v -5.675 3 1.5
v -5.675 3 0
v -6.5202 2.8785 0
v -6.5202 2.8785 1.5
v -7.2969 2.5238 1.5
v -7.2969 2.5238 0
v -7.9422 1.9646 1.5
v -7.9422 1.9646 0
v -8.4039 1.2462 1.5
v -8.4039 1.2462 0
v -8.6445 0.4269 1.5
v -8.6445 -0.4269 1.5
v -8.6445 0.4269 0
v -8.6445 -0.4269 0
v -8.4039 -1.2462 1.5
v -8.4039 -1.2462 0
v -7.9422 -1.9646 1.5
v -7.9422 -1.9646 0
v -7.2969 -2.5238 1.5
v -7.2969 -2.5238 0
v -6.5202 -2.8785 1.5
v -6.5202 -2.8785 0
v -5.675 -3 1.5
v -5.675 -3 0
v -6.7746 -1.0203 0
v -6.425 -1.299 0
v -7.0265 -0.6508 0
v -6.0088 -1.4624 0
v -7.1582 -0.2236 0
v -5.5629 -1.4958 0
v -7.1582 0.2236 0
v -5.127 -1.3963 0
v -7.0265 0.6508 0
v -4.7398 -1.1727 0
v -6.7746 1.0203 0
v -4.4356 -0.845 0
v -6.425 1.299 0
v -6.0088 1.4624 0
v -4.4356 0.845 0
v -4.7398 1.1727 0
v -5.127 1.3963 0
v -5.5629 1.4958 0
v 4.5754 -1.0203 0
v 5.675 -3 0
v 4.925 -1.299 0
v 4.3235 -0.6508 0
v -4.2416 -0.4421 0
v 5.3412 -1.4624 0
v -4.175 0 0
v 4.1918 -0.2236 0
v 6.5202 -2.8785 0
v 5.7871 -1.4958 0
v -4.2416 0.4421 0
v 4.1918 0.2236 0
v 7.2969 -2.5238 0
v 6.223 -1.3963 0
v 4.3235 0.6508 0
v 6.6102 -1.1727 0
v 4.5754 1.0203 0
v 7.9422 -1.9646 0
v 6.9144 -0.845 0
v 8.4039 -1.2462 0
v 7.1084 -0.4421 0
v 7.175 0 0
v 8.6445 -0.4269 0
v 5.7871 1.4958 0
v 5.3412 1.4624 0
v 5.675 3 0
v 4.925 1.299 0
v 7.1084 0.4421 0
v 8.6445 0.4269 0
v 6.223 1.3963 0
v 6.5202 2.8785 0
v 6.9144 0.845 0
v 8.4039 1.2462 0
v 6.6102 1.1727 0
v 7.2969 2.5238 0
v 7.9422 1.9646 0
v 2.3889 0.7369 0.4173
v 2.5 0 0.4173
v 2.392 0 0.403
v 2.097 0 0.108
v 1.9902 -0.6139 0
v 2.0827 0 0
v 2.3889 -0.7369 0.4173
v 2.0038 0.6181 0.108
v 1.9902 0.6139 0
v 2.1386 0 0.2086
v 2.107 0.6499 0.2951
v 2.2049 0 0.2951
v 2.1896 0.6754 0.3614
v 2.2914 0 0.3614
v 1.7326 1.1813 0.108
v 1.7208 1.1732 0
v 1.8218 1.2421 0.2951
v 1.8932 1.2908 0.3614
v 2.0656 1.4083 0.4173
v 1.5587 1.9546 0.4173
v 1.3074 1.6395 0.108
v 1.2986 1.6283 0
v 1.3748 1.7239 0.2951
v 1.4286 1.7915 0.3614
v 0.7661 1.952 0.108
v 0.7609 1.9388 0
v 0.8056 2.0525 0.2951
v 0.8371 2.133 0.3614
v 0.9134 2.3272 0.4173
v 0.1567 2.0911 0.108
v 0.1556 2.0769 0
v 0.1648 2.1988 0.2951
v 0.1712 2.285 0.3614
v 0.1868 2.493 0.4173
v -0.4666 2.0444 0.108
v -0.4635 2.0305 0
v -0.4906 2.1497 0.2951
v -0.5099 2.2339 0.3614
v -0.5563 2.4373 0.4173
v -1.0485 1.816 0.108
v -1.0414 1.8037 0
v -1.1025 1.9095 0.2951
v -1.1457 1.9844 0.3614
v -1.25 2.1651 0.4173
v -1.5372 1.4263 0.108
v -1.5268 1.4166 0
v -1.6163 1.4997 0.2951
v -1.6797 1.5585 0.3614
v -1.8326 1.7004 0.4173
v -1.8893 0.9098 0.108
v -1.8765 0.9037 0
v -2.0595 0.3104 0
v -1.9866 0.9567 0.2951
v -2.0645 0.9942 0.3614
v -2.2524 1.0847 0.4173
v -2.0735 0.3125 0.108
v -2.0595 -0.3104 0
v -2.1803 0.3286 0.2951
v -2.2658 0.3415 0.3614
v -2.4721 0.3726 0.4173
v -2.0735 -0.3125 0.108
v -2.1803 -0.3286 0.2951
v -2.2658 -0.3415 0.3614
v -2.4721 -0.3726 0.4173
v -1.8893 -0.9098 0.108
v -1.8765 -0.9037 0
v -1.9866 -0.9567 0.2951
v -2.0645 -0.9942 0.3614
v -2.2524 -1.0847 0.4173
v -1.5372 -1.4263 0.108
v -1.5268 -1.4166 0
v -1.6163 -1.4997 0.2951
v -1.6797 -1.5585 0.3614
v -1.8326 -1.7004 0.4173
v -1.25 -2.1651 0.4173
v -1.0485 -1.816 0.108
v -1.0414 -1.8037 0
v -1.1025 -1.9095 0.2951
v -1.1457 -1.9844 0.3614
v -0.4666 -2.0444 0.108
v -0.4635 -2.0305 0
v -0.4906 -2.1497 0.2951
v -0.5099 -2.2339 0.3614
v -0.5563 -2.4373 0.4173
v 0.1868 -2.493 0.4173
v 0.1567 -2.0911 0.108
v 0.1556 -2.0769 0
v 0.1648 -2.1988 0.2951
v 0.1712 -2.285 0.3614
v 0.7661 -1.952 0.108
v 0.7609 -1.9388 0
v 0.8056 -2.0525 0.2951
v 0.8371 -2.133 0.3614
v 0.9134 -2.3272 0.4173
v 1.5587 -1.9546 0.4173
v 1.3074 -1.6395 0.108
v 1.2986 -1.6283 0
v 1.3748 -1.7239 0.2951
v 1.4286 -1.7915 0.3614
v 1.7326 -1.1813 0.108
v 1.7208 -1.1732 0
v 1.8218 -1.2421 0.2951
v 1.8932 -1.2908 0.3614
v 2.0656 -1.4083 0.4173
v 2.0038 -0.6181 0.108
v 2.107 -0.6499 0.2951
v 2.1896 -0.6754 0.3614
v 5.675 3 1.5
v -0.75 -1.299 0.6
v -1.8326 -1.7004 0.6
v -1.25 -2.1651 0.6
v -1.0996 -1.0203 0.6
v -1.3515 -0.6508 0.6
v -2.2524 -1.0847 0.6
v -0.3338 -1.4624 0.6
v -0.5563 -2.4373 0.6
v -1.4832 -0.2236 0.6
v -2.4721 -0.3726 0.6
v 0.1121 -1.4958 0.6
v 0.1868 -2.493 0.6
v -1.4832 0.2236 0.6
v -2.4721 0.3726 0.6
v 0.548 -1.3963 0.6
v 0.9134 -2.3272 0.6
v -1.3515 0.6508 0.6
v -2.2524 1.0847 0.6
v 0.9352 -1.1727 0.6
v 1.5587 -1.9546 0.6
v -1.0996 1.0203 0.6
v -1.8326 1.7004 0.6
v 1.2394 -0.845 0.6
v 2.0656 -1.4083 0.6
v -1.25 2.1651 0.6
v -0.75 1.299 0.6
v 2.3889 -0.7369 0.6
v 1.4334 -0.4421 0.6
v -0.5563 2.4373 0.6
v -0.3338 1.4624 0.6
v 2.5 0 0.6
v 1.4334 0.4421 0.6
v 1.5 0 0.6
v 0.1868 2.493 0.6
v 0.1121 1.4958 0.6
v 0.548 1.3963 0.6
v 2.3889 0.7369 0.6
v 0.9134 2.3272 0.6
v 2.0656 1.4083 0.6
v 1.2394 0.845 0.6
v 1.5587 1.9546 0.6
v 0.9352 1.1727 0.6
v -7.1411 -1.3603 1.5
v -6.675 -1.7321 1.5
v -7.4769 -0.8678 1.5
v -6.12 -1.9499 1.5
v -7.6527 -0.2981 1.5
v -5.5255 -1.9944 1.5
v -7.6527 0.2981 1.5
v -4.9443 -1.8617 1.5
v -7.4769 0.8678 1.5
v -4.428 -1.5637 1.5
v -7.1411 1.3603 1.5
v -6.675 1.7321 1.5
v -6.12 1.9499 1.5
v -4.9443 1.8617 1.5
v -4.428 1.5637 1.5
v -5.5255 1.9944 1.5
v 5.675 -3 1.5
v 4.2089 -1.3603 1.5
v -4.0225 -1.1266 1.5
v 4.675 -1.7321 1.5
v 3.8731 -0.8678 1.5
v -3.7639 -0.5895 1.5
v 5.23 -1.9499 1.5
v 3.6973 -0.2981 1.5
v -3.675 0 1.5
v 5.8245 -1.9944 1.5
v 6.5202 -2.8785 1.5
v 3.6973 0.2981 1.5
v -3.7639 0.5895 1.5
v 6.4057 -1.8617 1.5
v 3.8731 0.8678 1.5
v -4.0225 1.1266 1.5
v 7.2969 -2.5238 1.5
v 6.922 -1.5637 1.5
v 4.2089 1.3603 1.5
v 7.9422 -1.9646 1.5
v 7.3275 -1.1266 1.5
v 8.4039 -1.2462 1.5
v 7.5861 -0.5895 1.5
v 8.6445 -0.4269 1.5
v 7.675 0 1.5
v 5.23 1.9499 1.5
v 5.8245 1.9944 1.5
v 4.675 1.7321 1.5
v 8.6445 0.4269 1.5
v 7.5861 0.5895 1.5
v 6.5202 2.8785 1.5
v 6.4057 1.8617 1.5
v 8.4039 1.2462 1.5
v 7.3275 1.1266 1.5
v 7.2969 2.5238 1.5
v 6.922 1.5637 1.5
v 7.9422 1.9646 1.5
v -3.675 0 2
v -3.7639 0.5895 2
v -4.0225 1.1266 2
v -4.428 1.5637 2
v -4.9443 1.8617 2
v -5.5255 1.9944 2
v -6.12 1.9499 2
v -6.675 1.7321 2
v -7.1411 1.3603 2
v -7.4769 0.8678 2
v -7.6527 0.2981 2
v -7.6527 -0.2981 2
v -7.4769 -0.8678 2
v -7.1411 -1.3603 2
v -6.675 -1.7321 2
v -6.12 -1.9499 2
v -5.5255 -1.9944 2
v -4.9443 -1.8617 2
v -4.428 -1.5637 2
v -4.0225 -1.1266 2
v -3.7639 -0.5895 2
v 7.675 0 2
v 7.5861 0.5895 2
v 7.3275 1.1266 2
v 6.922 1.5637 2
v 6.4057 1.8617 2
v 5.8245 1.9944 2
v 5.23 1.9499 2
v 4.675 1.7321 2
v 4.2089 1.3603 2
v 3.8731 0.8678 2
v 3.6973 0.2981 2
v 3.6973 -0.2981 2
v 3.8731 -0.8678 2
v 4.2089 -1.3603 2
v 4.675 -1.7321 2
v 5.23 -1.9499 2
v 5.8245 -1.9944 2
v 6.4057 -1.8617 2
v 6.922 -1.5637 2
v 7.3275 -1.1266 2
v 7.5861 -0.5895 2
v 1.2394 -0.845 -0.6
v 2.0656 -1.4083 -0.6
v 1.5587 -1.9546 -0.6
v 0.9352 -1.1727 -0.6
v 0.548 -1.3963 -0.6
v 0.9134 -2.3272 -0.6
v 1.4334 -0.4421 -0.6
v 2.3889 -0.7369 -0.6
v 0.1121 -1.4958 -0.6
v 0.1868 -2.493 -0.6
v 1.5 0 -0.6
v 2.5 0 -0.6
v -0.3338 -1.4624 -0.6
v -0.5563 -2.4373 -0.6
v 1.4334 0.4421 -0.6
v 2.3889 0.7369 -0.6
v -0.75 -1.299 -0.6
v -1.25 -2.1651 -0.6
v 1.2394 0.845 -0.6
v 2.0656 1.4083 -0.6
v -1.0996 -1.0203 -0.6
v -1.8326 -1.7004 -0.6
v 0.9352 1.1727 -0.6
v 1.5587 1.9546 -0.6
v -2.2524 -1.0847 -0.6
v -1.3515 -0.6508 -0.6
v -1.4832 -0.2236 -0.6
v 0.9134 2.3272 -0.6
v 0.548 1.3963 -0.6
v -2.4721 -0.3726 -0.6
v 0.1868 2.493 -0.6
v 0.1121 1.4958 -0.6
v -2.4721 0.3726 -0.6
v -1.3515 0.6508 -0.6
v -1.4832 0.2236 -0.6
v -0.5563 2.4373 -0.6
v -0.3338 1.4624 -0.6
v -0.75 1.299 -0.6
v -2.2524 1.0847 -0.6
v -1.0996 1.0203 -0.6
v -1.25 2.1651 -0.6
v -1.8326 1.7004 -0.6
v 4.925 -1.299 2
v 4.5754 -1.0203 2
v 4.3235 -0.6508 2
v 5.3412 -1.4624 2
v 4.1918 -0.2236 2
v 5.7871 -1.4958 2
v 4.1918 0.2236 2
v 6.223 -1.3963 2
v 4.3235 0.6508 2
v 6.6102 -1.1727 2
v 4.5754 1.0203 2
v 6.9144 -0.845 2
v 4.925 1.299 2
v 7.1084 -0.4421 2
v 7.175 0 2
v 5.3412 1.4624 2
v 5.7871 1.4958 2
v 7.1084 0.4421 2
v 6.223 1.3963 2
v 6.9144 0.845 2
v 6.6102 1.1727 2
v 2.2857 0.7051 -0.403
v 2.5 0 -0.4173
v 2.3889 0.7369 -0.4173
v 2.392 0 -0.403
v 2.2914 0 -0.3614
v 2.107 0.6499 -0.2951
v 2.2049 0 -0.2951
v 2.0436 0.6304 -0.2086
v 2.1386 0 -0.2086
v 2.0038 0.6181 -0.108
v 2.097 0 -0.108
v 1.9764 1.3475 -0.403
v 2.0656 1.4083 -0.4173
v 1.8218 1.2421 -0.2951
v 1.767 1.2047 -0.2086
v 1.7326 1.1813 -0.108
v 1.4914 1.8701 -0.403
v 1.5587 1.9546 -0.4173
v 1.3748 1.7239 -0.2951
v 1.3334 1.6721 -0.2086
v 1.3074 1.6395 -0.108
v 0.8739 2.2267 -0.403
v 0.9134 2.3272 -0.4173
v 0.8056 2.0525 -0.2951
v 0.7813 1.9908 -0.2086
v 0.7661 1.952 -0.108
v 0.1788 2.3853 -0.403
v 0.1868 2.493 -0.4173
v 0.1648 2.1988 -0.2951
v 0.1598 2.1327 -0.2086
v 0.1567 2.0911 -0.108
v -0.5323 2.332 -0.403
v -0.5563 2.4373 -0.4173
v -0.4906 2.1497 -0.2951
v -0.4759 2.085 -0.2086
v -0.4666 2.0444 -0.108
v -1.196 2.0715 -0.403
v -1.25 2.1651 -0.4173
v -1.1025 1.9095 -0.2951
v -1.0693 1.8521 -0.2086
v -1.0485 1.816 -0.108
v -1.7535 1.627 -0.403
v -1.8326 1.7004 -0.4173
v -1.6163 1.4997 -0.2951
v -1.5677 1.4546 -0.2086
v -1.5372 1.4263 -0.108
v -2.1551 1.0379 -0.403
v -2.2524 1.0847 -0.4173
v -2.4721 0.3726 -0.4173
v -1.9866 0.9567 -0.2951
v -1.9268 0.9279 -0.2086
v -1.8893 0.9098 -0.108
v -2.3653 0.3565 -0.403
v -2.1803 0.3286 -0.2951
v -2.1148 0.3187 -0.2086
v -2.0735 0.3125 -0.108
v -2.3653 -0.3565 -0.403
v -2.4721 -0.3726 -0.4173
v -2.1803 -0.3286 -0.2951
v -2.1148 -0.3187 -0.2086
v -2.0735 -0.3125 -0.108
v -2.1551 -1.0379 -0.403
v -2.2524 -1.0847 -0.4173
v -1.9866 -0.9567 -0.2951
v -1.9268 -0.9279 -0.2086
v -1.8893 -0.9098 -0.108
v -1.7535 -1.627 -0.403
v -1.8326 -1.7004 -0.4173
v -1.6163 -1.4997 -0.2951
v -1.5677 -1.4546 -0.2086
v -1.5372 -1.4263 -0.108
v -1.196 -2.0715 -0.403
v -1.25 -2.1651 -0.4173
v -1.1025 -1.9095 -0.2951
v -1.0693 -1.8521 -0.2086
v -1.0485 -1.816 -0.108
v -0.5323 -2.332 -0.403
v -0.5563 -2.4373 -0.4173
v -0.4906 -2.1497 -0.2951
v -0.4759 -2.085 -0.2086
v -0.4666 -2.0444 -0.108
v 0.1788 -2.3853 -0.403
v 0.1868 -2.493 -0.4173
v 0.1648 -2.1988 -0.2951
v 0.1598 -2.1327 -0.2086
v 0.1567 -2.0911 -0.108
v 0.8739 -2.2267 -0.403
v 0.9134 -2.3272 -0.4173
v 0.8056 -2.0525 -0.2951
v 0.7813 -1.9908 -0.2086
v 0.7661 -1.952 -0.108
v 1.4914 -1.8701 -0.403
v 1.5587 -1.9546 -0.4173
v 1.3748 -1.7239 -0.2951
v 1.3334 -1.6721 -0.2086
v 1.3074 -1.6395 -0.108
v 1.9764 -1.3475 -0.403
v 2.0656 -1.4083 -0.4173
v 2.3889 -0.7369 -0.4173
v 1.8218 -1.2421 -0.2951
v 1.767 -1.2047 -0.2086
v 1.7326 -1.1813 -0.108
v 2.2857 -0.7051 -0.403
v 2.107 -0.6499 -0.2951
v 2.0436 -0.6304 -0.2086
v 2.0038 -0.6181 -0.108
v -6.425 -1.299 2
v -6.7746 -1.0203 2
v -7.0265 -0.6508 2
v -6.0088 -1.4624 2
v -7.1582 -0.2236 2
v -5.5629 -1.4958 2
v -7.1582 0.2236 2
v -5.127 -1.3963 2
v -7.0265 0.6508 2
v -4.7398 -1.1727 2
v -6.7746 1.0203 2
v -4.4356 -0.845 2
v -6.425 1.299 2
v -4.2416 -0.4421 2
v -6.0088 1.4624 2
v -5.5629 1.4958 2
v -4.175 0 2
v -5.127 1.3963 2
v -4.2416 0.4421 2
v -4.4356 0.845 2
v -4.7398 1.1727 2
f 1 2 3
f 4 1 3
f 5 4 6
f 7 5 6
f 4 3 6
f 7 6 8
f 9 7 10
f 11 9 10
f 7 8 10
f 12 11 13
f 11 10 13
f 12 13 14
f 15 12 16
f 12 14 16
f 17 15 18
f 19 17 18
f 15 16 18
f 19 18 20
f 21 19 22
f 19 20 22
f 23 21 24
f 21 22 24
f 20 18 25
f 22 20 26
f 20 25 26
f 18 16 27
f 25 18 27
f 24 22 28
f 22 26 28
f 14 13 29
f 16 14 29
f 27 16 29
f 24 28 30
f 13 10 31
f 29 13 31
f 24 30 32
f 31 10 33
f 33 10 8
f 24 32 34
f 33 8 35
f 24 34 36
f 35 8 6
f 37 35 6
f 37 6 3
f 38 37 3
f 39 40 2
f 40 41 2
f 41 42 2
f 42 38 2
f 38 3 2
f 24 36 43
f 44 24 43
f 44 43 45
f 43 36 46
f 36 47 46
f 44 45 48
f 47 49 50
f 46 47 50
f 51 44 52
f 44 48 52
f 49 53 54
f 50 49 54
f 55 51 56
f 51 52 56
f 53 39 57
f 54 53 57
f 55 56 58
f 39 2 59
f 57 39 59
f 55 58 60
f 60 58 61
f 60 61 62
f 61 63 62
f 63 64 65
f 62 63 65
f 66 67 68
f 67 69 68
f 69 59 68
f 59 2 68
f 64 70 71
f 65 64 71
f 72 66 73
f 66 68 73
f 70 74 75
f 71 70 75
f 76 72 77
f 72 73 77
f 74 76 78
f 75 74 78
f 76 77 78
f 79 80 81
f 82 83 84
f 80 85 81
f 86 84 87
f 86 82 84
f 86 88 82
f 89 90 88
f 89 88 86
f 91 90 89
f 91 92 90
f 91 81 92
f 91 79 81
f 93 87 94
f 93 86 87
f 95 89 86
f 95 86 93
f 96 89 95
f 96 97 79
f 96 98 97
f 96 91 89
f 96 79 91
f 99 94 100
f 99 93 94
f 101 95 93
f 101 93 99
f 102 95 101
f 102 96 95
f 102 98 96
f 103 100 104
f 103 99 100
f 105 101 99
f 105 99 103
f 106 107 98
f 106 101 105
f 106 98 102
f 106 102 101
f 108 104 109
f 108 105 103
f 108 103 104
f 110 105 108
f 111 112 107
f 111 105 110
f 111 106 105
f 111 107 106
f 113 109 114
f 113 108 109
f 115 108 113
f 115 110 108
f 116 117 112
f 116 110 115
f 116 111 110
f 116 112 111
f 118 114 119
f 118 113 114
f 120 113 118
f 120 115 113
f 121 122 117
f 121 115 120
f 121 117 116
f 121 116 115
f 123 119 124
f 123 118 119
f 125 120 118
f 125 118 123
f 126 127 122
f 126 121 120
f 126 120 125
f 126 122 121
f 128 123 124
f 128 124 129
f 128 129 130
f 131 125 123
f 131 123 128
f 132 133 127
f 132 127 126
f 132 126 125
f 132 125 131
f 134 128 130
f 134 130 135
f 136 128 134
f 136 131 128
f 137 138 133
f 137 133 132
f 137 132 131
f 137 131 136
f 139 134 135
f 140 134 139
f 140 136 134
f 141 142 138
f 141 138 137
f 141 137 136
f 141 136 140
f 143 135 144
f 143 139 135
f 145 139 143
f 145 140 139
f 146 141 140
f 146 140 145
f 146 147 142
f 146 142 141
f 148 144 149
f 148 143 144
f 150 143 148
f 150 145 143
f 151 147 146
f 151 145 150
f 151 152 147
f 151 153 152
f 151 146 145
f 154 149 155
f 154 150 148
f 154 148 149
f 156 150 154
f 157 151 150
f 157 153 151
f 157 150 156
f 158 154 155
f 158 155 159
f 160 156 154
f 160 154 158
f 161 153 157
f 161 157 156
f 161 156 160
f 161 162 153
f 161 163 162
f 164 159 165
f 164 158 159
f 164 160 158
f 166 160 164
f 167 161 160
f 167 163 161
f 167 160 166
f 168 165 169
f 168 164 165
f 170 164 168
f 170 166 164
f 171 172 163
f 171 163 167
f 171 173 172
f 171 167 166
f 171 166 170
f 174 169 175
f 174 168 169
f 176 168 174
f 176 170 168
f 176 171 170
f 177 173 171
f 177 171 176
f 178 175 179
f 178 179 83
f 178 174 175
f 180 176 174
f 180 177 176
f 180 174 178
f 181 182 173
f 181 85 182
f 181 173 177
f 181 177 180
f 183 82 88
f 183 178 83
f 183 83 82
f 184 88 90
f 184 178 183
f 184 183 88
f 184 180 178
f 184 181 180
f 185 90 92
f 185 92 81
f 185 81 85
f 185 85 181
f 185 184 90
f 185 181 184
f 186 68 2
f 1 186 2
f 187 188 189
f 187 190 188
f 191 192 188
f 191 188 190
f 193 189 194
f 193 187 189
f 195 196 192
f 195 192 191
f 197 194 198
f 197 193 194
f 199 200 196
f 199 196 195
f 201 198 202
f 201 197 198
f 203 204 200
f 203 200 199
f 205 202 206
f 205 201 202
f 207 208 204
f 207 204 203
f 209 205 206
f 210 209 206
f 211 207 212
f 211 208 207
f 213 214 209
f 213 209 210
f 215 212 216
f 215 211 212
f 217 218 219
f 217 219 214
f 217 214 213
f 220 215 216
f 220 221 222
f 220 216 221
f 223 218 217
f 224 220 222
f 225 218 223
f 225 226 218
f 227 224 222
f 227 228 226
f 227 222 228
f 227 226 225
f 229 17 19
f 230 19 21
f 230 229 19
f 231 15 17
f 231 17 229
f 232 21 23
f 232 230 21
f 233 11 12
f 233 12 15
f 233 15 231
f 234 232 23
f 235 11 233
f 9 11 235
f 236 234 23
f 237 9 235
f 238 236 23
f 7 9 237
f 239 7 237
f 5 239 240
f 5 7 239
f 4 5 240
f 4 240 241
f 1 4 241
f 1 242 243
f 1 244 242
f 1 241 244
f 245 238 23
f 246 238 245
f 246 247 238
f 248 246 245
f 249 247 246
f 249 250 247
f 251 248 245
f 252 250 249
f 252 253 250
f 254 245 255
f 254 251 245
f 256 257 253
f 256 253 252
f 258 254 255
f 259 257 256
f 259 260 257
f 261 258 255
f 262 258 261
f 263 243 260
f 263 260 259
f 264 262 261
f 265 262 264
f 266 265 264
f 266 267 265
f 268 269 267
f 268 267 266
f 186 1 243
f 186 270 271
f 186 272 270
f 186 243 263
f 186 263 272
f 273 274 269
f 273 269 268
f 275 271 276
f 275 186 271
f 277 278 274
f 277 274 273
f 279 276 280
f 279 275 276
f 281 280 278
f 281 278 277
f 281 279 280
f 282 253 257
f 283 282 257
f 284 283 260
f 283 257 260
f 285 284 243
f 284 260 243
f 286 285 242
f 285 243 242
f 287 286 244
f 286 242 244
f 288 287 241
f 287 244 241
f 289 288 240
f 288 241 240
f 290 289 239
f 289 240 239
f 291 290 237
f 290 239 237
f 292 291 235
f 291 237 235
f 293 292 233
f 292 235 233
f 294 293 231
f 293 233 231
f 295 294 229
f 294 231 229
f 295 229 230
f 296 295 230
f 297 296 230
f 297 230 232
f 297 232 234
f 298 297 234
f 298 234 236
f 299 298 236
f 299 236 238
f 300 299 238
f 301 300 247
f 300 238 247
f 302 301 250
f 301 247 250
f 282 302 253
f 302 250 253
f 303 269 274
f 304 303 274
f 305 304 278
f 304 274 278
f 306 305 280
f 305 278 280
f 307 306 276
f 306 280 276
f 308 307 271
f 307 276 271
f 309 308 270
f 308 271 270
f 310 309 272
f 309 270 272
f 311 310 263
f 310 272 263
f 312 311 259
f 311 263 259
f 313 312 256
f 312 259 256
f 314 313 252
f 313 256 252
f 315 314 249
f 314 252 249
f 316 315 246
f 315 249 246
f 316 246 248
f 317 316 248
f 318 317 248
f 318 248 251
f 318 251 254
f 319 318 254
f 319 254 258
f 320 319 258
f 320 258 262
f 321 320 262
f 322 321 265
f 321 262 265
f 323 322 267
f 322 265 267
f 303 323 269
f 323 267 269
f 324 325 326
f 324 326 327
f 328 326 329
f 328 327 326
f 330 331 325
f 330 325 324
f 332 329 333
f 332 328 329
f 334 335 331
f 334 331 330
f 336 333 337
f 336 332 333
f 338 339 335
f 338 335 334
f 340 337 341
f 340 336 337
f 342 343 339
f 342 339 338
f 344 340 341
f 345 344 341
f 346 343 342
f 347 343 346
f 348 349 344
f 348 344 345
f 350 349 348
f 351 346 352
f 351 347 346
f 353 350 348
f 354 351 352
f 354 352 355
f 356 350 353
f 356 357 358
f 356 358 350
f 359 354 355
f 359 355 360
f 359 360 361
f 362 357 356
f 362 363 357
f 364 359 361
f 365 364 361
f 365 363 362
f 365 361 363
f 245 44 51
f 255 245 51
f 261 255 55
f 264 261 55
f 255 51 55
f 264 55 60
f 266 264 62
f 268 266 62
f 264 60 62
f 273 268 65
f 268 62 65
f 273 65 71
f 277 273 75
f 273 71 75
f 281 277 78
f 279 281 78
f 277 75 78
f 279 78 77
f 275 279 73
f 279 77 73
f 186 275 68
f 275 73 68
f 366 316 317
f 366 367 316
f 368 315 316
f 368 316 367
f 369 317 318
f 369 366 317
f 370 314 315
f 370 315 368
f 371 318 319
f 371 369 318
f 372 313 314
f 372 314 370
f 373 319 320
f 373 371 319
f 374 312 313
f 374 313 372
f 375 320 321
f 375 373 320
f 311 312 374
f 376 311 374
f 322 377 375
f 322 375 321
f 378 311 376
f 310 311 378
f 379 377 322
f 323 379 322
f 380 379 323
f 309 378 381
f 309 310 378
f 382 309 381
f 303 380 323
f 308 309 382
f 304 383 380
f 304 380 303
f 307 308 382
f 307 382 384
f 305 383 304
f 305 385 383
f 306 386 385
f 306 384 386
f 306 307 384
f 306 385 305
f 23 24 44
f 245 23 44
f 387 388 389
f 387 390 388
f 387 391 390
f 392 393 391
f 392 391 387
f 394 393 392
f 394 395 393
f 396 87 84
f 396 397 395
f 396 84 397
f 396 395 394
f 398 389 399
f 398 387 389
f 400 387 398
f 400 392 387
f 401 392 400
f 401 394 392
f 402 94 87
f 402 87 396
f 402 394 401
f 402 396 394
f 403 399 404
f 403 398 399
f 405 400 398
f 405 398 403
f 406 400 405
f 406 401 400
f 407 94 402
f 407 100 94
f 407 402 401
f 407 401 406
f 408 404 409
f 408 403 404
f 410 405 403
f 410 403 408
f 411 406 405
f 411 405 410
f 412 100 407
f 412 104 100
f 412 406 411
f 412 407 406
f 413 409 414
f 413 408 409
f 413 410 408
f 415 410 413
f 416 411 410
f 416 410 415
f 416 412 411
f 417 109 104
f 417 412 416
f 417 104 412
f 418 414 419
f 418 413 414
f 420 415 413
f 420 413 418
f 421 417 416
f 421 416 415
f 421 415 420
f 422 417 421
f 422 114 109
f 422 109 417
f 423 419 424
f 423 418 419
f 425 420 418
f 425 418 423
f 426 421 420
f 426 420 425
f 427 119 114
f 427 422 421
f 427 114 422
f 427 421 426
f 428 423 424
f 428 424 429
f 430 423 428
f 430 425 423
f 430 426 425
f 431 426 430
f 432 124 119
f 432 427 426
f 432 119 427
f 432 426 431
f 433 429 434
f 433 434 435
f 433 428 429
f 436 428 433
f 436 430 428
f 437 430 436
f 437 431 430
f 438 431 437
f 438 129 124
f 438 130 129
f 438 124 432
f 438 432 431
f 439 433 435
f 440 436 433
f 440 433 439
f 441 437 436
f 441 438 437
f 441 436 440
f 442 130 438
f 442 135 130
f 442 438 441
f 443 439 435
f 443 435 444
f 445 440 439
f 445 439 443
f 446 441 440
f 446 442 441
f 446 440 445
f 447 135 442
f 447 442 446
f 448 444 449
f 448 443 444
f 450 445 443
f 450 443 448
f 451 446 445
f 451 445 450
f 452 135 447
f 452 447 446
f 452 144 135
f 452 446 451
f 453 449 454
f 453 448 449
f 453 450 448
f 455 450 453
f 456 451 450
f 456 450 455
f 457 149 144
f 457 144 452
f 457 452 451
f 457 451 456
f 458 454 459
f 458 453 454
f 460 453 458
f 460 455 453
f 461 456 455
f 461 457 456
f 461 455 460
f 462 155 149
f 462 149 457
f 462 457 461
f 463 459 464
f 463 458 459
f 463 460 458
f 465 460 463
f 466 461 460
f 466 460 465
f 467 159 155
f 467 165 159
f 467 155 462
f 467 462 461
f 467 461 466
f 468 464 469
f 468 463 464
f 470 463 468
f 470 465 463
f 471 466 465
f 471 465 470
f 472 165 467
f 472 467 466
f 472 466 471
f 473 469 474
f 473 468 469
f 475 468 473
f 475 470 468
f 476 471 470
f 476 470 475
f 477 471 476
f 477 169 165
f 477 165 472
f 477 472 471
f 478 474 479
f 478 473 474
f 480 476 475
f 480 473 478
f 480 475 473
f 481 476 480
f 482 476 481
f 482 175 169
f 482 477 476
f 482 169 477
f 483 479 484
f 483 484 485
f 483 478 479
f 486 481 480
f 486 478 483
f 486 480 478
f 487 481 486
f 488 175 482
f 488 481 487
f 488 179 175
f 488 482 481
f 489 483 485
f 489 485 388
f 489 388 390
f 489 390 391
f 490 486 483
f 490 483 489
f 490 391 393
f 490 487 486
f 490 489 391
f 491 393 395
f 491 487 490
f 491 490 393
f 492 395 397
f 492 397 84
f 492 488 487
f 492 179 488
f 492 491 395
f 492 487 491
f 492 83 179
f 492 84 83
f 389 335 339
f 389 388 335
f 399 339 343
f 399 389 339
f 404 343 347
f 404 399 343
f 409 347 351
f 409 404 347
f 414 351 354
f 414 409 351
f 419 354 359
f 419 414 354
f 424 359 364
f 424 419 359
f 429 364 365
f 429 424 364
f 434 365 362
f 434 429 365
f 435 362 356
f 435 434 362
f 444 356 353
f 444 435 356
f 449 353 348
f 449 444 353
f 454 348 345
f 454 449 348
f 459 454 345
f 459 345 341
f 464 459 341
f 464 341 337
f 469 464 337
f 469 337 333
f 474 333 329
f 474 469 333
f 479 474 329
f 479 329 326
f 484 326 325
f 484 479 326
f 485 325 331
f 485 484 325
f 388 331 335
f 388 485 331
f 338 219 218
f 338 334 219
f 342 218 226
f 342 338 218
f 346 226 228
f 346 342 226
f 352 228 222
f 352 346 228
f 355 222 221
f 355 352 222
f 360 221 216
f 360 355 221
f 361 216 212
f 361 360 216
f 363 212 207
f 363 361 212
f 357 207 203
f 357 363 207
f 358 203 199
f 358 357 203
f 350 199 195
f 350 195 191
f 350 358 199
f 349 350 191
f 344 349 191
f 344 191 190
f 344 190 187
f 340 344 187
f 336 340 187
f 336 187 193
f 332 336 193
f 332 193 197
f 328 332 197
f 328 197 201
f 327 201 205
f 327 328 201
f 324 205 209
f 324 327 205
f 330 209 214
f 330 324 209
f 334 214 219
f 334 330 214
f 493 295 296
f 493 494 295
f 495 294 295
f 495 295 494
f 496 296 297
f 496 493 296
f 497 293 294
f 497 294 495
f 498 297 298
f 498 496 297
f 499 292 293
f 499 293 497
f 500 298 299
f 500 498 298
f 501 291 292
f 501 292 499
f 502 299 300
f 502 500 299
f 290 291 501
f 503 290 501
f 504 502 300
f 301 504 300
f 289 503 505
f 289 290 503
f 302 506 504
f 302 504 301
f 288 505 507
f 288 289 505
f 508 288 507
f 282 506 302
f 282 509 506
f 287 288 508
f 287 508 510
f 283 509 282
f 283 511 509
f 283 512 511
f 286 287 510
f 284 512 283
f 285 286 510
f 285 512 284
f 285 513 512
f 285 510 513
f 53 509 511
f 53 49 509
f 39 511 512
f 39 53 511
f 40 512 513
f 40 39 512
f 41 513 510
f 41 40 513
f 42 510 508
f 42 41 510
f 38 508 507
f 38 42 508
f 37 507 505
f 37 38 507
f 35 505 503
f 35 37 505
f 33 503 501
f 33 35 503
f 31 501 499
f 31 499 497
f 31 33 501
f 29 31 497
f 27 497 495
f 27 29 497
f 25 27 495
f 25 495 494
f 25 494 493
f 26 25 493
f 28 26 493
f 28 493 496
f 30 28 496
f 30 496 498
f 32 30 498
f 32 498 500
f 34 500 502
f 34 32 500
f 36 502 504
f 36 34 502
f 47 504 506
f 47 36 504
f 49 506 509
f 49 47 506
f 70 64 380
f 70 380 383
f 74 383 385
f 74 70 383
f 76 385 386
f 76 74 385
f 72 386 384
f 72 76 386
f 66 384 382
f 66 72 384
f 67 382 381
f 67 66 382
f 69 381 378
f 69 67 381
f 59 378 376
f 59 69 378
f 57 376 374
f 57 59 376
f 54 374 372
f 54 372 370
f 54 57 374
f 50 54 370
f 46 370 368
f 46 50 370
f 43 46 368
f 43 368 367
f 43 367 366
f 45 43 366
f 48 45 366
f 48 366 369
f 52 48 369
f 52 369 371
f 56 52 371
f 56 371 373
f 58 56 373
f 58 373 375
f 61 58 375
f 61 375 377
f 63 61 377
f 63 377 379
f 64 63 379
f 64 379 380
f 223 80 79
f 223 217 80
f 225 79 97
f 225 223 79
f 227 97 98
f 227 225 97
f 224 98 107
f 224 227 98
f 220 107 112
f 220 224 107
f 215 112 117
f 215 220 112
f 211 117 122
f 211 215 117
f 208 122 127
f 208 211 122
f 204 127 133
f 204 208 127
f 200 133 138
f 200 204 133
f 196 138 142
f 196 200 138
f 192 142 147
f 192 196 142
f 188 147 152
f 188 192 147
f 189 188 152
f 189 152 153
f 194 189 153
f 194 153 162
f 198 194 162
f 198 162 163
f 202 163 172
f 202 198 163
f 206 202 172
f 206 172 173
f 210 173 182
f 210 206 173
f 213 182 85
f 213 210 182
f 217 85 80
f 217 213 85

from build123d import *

# Parameters (mm, degrees)
F0_R     = 1.5
F1_DEPTH = 1.5
F2_R     = 2
F2_R_2   = 1.5
F3_DEPTH = 0.5


with BuildPart() as f1:
    # F0 (on Top) → F1 (new body)
    with BuildSketch(Plane.XY):
        with BuildLine():
            Line((0, 3), (-5.675, 3))
            ThreePointArc((-5.675, 3), (-8.675, 0), (-5.675, -3))
            Line((-5.675, -3), (0, -3))
            Line((0, -3), (5.675, -3))
            ThreePointArc((5.675, -3), (8.675, 0), (5.675, 3))
            Line((5.675, 3), (0, 3))
        make_face()
        with Locations((-5.675, 0)):
            Circle(F0_R, mode=Mode.SUBTRACT)
        with Locations((5.675, 0)):
            Circle(F0_R, mode=Mode.SUBTRACT)
    extrude(amount=F1_DEPTH)

    # F2 (on face) → F3 (join)
    with BuildSketch(Plane.XY.offset(1.5)):
        with Locations((-5.675, 0)):
            Circle(F2_R)
        with Locations((-5.675, 0)):
            Circle(F2_R_2, mode=Mode.SUBTRACT)
        with Locations((5.675, 0)):
            Circle(F2_R)
        with Locations((5.675, 0)):
            Circle(F2_R_2, mode=Mode.SUBTRACT)
    extrude(amount=F3_DEPTH)


with BuildPart() as f5:
    # F4 (on Front) → F5 (revolve)
    with BuildSketch(Plane.XZ):
        with BuildLine():
            Line((1.5, 0.6), (1.5, 0))
            Line((1.5, 0), (1.5, -0.6))
            Line((1.5, -0.6), (2.5, -0.6))
            Line((2.5, -0.6), (2.5, -0.417265))
            ThreePointArc((2.5, -0.417265), (2.204949, -0.295051), (2.082735, 0))
            ThreePointArc((2.082735, 0), (2.204949, 0.295051), (2.5, 0.417265))
            Line((2.5, 0.417265), (2.5, 0.6))
            Line((2.5, 0.6), (1.5, 0.6))
        make_face()
    revolve(axis=Axis((0, 0, 0.320348), (0, 0, 1)))


solid = Compound([f1.part, f5.part])
